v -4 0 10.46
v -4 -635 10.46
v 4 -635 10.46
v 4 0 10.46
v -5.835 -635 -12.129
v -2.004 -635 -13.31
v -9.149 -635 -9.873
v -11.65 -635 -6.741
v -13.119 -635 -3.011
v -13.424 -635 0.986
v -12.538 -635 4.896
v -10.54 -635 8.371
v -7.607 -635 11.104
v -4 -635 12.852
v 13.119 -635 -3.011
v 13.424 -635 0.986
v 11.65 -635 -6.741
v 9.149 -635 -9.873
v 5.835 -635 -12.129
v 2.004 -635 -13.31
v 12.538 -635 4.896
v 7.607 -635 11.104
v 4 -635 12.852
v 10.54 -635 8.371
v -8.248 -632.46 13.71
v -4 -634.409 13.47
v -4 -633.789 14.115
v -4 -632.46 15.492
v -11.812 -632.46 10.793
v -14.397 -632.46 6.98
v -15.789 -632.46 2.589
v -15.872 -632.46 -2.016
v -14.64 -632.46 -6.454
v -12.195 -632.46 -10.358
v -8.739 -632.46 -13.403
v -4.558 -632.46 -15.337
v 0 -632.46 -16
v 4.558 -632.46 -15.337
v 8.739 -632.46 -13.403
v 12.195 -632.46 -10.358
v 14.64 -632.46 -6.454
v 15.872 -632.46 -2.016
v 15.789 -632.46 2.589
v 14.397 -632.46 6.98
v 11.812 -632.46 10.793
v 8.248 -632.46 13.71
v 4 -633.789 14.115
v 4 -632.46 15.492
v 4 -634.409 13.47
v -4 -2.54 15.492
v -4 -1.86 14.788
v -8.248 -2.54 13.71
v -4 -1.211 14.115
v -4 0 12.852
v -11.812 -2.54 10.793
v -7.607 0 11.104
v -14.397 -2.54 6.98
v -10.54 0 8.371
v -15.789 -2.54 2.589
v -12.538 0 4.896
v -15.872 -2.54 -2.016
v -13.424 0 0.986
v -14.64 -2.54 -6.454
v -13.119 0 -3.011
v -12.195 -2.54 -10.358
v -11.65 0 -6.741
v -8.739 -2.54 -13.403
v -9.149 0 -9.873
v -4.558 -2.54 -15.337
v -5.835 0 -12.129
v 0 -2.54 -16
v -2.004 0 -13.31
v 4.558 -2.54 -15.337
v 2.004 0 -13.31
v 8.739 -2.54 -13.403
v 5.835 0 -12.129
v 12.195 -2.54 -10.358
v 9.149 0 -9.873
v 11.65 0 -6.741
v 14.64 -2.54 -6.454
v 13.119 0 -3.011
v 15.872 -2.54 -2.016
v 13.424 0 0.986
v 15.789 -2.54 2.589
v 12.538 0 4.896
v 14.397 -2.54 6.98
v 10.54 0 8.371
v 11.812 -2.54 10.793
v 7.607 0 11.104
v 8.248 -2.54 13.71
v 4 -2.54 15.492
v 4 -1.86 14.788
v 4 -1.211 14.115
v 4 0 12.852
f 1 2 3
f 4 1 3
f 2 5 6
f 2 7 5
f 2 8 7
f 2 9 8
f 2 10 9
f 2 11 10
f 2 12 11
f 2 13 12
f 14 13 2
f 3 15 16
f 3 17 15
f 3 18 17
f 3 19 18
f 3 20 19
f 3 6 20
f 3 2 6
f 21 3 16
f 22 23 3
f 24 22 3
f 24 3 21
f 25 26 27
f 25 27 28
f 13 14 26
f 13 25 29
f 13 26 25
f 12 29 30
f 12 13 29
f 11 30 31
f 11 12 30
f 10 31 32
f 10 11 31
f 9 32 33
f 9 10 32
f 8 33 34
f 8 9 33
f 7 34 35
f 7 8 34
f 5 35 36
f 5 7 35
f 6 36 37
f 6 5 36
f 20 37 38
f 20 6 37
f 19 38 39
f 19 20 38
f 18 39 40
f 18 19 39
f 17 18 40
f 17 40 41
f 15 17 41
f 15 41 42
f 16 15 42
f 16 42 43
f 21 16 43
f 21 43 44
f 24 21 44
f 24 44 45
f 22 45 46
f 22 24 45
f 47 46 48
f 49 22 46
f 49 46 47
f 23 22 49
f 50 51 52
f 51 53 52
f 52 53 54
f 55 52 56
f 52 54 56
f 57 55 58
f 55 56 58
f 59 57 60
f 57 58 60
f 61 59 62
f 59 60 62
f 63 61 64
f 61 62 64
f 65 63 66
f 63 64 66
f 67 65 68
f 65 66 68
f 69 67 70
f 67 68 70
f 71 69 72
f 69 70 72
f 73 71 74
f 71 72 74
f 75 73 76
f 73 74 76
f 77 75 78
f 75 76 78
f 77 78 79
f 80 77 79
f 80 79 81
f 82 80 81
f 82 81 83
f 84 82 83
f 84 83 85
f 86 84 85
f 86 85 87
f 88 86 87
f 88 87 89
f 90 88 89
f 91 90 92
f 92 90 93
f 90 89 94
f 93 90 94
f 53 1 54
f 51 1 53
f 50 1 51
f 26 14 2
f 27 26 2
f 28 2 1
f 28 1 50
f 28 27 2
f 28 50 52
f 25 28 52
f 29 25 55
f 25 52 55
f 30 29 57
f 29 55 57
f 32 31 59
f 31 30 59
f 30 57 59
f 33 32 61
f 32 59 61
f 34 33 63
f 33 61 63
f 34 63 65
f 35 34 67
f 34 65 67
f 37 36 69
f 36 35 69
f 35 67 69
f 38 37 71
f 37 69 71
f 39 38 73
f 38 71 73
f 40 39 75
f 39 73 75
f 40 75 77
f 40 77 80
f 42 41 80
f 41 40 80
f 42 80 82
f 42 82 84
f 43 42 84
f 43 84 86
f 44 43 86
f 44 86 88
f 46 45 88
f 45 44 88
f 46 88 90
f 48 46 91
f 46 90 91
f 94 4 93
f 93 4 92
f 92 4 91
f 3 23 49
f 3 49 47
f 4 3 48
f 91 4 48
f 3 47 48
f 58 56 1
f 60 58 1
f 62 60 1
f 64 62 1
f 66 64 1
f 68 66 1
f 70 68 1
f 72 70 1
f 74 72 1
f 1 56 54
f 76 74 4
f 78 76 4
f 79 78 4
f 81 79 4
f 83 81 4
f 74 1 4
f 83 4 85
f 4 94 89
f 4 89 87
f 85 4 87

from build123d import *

# Parameters (mm, degrees)
F0_R     = 16
F1_DEPTH = 635
F2_SIZE  = 2.54
F3_W     = 8
F3_H     = 6
F4_DEPTH = 635.001


with BuildPart() as f1:
    # F0 (on Front) → F1 (new body)
    with BuildSketch(Plane.XZ):
        Circle(F0_R)
    extrude(amount=F1_DEPTH)

    # F2
    f2_edges = [f1.edges().sort_by_distance(p)[0] for p in [
        (-16, 0, 0),
        (-16, -635, 0),
    ]]
    chamfer(f2_edges, length=F2_SIZE)

    # F3 (on face) → F4 (cut, through all)
    with BuildSketch(Plane.XZ.offset(635)):
        with Locations((0, 13.46)):
            Rectangle(F3_W, F3_H)
    extrude(amount=-F4_DEPTH, mode=Mode.SUBTRACT)


solid = f1.part
